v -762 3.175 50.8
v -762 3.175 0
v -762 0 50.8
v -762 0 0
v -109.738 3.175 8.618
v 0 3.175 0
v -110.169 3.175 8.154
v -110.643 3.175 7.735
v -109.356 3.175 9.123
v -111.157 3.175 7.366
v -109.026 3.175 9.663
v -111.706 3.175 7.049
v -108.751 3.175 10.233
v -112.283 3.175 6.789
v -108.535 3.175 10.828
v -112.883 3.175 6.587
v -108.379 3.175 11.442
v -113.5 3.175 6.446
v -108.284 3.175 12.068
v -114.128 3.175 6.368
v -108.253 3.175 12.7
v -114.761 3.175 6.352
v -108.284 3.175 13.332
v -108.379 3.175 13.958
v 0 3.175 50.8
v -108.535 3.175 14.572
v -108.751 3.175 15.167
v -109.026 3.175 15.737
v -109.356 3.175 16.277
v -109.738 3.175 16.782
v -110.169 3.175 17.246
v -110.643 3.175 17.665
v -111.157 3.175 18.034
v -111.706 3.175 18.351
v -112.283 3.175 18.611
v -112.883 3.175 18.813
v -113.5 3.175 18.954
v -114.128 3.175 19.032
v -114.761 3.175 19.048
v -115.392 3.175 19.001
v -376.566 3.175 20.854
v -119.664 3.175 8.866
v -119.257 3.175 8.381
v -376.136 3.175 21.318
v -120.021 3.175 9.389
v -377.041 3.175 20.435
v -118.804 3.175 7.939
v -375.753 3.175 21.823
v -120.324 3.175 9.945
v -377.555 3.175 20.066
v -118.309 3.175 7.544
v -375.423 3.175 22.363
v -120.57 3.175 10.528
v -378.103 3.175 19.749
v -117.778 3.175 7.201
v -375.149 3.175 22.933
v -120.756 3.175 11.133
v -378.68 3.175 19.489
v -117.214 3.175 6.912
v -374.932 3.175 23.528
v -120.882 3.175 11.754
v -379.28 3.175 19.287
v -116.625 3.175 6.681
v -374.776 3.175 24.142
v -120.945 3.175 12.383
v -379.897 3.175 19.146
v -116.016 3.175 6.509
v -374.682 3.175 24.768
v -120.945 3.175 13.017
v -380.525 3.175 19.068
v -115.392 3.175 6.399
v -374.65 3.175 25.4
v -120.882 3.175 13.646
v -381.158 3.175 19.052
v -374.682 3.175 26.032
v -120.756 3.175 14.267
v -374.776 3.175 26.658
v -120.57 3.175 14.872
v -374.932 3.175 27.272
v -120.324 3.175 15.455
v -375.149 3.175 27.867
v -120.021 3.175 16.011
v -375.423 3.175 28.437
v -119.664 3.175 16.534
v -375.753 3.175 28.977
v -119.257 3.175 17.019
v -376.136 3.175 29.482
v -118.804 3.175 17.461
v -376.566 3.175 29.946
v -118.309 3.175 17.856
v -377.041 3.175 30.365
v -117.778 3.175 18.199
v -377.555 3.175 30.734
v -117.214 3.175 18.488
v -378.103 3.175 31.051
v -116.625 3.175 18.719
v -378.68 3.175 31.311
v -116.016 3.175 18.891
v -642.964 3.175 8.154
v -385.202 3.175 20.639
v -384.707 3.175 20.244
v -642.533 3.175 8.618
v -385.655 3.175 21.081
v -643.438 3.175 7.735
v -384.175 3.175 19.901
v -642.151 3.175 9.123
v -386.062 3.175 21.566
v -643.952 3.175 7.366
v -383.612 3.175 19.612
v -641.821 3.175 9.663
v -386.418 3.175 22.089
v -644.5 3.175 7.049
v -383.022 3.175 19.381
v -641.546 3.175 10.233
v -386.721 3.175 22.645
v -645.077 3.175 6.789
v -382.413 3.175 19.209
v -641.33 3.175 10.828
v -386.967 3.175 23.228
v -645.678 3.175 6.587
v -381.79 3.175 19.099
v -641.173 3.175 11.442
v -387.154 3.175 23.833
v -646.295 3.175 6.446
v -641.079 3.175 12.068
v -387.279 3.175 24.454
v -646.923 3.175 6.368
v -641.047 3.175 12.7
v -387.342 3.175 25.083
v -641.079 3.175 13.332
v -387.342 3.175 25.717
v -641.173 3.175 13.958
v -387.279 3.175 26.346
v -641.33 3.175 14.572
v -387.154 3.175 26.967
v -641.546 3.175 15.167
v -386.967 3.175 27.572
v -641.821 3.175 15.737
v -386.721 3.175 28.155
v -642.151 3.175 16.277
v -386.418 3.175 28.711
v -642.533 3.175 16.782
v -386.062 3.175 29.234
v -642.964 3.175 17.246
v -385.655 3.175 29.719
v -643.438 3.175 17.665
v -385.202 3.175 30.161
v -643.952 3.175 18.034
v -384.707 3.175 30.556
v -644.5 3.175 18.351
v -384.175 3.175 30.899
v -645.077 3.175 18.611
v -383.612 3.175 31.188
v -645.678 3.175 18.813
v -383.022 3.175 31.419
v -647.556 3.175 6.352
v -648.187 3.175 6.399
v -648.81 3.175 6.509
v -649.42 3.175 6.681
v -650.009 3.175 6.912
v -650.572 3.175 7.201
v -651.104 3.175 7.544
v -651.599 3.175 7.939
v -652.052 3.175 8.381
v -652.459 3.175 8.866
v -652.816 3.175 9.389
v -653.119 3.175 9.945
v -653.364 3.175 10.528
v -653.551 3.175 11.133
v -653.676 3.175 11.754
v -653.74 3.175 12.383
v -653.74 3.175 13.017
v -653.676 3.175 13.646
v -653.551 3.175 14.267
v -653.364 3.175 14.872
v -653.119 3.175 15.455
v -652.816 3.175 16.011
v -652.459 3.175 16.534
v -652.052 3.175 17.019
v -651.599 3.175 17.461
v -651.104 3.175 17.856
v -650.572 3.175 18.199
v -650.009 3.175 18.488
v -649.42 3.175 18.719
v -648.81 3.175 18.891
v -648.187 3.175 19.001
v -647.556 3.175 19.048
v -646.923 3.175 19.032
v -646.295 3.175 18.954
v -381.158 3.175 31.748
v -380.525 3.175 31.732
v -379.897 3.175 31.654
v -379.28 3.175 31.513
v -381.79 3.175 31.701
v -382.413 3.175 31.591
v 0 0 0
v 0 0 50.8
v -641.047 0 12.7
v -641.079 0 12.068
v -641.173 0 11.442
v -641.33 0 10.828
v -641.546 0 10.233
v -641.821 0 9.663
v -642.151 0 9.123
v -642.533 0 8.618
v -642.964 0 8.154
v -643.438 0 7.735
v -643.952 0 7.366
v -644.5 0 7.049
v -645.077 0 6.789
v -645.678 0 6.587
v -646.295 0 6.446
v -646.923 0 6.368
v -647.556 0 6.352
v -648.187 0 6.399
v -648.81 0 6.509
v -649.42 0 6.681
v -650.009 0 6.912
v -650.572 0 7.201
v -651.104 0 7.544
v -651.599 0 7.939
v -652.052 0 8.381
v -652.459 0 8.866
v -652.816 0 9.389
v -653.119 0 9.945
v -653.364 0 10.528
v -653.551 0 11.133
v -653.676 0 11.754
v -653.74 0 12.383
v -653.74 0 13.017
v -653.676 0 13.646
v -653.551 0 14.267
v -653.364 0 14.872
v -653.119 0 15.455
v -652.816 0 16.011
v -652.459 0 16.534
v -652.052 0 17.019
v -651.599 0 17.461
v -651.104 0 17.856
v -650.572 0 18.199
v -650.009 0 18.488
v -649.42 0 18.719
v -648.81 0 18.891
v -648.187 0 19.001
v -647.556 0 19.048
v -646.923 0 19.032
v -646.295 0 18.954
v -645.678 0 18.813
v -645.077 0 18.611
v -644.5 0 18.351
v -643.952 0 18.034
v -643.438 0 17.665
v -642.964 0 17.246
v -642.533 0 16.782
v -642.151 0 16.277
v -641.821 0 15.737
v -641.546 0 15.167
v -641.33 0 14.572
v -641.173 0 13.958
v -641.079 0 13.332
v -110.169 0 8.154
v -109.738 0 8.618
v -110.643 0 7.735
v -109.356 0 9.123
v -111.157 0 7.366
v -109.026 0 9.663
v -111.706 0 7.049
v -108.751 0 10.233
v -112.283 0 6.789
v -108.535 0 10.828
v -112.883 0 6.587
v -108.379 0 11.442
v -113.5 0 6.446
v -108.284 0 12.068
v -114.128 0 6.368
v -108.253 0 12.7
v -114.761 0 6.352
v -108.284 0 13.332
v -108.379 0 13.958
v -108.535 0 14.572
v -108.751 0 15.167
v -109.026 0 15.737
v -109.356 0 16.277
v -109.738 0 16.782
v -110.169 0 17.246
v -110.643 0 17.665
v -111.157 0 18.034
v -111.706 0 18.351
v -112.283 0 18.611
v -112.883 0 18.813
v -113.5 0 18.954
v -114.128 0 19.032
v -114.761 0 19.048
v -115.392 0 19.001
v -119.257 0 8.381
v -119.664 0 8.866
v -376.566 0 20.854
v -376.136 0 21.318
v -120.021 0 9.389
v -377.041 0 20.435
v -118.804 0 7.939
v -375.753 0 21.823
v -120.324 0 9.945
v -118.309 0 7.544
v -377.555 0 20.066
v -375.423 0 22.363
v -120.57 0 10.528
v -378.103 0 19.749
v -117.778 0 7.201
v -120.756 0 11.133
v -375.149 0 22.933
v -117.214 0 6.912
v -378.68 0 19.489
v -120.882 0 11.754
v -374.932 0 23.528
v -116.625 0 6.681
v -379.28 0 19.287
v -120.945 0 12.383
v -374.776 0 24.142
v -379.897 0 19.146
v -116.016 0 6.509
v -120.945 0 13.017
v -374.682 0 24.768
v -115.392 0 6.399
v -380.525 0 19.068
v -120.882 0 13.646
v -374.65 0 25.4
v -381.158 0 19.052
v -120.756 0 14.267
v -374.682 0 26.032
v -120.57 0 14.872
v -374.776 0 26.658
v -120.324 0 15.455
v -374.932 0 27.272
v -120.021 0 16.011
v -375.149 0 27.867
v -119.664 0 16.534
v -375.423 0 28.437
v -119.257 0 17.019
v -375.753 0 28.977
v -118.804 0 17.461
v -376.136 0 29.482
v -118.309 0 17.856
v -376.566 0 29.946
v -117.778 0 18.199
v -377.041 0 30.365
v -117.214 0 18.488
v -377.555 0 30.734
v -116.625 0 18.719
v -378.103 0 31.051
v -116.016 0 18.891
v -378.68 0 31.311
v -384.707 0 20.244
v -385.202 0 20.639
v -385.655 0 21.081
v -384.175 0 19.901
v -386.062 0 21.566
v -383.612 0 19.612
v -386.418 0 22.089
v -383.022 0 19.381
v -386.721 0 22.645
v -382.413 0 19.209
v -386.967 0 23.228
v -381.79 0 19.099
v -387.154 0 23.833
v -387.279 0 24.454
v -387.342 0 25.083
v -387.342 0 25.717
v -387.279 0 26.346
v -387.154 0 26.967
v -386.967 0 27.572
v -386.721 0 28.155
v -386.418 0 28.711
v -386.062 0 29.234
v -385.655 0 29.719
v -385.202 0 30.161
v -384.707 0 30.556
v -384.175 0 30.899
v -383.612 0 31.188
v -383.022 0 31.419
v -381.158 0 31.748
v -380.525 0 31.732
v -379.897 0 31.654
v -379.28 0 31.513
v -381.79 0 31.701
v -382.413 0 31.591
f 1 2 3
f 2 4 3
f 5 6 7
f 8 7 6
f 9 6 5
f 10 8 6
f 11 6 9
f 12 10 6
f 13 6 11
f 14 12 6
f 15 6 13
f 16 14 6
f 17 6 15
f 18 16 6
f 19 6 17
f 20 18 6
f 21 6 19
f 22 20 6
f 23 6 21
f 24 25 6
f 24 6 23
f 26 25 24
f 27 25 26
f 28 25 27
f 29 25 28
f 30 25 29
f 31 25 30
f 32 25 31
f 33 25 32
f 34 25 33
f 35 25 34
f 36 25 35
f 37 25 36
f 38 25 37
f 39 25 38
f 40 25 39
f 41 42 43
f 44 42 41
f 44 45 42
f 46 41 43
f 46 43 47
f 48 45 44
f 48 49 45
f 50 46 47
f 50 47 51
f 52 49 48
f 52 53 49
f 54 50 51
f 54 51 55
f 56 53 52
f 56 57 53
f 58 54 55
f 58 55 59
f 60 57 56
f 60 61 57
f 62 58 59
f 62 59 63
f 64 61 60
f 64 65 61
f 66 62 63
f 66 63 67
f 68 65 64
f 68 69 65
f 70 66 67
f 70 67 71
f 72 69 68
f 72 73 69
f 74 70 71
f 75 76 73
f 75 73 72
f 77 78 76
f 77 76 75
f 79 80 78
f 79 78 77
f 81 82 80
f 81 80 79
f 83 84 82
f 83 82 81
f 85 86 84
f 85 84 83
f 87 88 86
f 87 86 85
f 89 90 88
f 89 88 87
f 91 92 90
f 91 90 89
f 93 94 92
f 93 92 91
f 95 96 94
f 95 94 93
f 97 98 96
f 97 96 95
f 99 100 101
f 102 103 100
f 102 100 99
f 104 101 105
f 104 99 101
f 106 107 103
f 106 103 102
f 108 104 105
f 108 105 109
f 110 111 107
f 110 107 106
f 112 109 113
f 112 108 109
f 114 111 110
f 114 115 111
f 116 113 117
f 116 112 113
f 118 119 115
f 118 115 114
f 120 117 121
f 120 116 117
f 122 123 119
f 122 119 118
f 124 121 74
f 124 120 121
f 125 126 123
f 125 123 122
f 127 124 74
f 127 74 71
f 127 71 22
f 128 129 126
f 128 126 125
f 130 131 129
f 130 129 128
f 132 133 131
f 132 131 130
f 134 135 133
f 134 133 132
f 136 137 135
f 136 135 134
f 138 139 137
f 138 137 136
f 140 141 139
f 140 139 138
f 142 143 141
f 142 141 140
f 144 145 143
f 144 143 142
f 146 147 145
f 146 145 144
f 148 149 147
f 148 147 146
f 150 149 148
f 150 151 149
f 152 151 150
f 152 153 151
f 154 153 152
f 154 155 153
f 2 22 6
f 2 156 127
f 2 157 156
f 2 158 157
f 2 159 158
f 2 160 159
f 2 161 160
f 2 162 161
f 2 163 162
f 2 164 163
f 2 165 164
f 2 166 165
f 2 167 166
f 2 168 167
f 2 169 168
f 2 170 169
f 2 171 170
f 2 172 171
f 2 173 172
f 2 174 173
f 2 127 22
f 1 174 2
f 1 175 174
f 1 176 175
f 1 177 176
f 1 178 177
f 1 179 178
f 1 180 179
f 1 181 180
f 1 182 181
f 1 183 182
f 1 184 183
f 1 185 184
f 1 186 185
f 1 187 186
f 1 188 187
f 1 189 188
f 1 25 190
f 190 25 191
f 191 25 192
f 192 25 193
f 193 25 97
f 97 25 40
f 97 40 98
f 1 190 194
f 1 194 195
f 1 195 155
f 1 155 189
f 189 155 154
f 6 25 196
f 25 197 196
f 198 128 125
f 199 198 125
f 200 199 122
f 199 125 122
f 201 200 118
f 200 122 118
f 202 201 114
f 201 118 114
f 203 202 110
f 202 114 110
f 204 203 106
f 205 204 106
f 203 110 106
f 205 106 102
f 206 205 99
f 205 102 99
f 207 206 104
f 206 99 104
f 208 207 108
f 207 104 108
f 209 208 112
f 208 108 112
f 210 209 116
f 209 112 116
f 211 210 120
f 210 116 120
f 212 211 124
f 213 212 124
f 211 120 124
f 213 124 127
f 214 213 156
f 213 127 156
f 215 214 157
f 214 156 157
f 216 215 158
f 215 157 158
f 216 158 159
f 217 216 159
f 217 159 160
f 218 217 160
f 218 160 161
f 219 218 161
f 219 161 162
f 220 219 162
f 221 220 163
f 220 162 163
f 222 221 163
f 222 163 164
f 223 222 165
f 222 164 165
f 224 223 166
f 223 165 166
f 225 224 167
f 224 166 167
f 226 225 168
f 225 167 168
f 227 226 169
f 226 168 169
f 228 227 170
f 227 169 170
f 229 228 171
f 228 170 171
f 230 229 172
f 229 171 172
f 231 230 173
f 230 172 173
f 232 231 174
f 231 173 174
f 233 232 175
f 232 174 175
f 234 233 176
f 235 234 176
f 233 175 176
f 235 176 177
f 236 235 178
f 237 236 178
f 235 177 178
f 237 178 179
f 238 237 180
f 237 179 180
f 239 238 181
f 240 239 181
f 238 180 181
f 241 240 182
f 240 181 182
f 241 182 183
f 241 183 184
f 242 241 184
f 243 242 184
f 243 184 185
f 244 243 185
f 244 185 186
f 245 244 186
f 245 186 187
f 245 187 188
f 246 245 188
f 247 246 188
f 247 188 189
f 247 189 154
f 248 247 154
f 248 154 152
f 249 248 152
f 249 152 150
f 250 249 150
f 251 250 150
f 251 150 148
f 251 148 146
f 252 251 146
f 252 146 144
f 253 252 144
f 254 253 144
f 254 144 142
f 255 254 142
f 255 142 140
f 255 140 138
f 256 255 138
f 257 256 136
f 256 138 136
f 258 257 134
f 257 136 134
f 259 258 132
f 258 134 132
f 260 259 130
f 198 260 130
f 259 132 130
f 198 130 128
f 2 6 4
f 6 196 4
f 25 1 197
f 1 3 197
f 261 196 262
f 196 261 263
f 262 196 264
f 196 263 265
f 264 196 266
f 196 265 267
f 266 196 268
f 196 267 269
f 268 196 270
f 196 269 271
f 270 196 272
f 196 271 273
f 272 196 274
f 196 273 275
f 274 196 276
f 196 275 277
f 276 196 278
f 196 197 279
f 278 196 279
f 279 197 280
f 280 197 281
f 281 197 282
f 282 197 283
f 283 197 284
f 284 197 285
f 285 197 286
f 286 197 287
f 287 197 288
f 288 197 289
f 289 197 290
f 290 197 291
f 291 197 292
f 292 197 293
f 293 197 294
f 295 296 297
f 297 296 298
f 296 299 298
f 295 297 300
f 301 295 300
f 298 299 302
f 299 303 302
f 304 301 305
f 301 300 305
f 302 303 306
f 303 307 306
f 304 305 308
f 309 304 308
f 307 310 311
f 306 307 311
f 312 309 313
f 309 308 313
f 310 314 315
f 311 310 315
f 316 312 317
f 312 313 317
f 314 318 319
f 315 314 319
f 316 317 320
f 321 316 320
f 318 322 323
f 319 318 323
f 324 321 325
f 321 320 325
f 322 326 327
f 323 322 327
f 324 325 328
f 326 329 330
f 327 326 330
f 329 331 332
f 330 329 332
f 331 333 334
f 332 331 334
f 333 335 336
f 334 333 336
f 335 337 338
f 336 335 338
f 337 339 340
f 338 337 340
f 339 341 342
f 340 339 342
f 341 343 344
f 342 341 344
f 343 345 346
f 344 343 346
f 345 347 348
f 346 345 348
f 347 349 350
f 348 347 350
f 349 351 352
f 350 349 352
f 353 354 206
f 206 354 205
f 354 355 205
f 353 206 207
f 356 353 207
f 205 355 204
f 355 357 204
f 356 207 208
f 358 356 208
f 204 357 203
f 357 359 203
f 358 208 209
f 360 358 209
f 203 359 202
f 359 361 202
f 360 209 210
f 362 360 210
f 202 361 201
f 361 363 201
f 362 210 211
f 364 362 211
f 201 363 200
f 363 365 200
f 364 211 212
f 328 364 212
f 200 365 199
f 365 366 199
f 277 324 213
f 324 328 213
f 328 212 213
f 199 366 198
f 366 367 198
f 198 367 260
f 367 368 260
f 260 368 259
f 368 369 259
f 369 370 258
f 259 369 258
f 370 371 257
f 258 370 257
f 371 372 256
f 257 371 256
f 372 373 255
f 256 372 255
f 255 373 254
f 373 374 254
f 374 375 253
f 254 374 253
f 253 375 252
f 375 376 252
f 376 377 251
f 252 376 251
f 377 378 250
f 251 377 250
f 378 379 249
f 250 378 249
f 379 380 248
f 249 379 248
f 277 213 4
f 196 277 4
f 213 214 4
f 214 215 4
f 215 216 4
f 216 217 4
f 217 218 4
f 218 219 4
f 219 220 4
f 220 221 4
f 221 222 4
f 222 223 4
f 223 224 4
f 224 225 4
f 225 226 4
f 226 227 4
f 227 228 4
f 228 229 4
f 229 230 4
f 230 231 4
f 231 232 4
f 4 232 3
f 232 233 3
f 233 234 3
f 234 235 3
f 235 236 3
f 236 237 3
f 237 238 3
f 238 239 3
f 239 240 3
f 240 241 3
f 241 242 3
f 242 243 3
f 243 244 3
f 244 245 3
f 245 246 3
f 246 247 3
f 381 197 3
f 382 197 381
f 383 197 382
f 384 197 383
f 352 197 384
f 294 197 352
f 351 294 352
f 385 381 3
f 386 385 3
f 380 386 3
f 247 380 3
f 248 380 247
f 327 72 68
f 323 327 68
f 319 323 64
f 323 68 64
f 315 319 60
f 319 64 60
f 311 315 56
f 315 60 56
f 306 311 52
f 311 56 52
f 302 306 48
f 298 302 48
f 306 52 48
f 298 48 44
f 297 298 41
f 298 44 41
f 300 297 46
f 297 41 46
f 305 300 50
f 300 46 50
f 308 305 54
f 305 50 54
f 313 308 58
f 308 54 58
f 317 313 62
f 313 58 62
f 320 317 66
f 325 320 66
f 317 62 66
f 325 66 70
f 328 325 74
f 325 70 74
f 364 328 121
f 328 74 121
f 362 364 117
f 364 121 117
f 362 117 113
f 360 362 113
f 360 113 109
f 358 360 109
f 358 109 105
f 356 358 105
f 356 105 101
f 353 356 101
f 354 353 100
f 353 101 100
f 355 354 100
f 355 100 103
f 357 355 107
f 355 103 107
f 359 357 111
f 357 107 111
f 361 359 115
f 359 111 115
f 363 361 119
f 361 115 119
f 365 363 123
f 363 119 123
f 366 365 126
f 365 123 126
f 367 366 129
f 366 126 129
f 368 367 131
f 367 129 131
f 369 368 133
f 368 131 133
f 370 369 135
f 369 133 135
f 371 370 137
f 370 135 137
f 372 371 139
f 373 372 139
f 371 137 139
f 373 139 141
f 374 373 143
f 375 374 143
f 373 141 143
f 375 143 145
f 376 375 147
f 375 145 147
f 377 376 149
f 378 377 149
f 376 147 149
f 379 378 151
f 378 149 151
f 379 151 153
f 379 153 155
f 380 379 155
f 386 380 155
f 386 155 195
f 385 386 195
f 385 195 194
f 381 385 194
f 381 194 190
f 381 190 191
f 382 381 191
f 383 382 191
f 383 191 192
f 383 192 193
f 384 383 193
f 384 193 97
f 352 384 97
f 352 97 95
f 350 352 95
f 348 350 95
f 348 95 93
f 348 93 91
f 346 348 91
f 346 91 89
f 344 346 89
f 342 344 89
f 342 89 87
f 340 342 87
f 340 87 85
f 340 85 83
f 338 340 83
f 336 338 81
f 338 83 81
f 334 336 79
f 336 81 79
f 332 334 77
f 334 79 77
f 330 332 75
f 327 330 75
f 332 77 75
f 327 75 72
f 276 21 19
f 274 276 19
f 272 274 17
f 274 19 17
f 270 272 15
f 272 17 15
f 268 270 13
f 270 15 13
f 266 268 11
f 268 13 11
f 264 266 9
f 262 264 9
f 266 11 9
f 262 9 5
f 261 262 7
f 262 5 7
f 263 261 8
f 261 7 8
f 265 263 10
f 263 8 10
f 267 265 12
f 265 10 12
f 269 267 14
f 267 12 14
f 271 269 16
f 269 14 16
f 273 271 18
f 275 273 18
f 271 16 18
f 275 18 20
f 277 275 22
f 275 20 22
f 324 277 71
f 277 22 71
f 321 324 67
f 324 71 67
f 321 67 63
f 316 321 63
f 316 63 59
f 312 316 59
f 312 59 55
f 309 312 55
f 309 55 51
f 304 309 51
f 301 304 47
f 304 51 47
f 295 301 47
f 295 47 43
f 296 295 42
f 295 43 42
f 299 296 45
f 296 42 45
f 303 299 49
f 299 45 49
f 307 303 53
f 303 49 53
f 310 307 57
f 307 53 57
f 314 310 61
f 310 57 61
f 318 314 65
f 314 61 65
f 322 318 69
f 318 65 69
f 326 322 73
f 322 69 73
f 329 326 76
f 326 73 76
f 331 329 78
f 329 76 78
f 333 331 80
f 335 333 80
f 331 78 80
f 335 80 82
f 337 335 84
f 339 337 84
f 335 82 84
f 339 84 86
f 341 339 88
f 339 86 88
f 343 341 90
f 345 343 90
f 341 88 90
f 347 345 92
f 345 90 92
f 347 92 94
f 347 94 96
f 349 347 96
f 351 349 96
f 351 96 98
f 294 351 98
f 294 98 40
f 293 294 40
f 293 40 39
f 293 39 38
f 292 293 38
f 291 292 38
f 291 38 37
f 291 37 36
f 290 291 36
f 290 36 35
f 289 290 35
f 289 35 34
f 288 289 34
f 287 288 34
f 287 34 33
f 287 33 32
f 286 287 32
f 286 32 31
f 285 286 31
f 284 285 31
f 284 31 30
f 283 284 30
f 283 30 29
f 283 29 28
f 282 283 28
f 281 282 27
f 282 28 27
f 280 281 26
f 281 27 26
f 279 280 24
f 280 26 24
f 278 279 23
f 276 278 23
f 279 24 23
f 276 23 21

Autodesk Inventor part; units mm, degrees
ref_plane "YZ Plane" through (0, 0, 0) normal (1, 0, 0) x (0, 1, 0)
ref_plane "XZ Plane" through (0, 0, 0) normal (0, 1, 0) x (-1, 0, 0)
ref_plane "XY Plane" through (0, 0, 0) normal (0, 0, 1) x (1, 0, 0)
sketch "Sketch1" plane through (0, 0, 0) normal (0, 1, 0) x (-1, 0, 0)
  line L0 (0, 0) -> (762, 0)
  line L1 (762, 0) -> (762, 50.8)
  line L2 (762, 50.8) -> (0, 50.8)
  line L3 (0, 50.8) -> (0, 0)
  dimension "d0" = 762
  dimension "d1" = 50.8
extrude "Extrusion1" add sketch "Sketch1" along normal blind 3.175
sketch "Sketch2" plane through (0, 3.175, 0) normal (0, 1, 0) x (1, 0, 0)
  circle A0 centre (-381, -25.4) radius 6.35
  line L0 (0, 0) -> (-762, 0) projected
  line L1 (0, -50.8) -> (0, 0) projected
  circle A1 centre (-114.6026, -12.7) radius 6.35
  line L2 (-762, -50.8) -> (0, -50.8) projected
  circle A2 centre (-647.3974, -12.7) radius 6.35
  dimension "d4" = 12.7
  dimension "d5" = 25.4
  dimension "d6" = 381
  dimension "d9" = 12.7
  dimension "d10" = 38.1
  dimension "d11" = 266.7
  dimension "d12" = 12.7
  dimension "d13" = 38.1
  dimension "d14" = 266.7
extrude "Extrusion2" cut sketch "Sketch2" against normal blind 3.175
properties part number "side plate" material "Aluminum 6061"
